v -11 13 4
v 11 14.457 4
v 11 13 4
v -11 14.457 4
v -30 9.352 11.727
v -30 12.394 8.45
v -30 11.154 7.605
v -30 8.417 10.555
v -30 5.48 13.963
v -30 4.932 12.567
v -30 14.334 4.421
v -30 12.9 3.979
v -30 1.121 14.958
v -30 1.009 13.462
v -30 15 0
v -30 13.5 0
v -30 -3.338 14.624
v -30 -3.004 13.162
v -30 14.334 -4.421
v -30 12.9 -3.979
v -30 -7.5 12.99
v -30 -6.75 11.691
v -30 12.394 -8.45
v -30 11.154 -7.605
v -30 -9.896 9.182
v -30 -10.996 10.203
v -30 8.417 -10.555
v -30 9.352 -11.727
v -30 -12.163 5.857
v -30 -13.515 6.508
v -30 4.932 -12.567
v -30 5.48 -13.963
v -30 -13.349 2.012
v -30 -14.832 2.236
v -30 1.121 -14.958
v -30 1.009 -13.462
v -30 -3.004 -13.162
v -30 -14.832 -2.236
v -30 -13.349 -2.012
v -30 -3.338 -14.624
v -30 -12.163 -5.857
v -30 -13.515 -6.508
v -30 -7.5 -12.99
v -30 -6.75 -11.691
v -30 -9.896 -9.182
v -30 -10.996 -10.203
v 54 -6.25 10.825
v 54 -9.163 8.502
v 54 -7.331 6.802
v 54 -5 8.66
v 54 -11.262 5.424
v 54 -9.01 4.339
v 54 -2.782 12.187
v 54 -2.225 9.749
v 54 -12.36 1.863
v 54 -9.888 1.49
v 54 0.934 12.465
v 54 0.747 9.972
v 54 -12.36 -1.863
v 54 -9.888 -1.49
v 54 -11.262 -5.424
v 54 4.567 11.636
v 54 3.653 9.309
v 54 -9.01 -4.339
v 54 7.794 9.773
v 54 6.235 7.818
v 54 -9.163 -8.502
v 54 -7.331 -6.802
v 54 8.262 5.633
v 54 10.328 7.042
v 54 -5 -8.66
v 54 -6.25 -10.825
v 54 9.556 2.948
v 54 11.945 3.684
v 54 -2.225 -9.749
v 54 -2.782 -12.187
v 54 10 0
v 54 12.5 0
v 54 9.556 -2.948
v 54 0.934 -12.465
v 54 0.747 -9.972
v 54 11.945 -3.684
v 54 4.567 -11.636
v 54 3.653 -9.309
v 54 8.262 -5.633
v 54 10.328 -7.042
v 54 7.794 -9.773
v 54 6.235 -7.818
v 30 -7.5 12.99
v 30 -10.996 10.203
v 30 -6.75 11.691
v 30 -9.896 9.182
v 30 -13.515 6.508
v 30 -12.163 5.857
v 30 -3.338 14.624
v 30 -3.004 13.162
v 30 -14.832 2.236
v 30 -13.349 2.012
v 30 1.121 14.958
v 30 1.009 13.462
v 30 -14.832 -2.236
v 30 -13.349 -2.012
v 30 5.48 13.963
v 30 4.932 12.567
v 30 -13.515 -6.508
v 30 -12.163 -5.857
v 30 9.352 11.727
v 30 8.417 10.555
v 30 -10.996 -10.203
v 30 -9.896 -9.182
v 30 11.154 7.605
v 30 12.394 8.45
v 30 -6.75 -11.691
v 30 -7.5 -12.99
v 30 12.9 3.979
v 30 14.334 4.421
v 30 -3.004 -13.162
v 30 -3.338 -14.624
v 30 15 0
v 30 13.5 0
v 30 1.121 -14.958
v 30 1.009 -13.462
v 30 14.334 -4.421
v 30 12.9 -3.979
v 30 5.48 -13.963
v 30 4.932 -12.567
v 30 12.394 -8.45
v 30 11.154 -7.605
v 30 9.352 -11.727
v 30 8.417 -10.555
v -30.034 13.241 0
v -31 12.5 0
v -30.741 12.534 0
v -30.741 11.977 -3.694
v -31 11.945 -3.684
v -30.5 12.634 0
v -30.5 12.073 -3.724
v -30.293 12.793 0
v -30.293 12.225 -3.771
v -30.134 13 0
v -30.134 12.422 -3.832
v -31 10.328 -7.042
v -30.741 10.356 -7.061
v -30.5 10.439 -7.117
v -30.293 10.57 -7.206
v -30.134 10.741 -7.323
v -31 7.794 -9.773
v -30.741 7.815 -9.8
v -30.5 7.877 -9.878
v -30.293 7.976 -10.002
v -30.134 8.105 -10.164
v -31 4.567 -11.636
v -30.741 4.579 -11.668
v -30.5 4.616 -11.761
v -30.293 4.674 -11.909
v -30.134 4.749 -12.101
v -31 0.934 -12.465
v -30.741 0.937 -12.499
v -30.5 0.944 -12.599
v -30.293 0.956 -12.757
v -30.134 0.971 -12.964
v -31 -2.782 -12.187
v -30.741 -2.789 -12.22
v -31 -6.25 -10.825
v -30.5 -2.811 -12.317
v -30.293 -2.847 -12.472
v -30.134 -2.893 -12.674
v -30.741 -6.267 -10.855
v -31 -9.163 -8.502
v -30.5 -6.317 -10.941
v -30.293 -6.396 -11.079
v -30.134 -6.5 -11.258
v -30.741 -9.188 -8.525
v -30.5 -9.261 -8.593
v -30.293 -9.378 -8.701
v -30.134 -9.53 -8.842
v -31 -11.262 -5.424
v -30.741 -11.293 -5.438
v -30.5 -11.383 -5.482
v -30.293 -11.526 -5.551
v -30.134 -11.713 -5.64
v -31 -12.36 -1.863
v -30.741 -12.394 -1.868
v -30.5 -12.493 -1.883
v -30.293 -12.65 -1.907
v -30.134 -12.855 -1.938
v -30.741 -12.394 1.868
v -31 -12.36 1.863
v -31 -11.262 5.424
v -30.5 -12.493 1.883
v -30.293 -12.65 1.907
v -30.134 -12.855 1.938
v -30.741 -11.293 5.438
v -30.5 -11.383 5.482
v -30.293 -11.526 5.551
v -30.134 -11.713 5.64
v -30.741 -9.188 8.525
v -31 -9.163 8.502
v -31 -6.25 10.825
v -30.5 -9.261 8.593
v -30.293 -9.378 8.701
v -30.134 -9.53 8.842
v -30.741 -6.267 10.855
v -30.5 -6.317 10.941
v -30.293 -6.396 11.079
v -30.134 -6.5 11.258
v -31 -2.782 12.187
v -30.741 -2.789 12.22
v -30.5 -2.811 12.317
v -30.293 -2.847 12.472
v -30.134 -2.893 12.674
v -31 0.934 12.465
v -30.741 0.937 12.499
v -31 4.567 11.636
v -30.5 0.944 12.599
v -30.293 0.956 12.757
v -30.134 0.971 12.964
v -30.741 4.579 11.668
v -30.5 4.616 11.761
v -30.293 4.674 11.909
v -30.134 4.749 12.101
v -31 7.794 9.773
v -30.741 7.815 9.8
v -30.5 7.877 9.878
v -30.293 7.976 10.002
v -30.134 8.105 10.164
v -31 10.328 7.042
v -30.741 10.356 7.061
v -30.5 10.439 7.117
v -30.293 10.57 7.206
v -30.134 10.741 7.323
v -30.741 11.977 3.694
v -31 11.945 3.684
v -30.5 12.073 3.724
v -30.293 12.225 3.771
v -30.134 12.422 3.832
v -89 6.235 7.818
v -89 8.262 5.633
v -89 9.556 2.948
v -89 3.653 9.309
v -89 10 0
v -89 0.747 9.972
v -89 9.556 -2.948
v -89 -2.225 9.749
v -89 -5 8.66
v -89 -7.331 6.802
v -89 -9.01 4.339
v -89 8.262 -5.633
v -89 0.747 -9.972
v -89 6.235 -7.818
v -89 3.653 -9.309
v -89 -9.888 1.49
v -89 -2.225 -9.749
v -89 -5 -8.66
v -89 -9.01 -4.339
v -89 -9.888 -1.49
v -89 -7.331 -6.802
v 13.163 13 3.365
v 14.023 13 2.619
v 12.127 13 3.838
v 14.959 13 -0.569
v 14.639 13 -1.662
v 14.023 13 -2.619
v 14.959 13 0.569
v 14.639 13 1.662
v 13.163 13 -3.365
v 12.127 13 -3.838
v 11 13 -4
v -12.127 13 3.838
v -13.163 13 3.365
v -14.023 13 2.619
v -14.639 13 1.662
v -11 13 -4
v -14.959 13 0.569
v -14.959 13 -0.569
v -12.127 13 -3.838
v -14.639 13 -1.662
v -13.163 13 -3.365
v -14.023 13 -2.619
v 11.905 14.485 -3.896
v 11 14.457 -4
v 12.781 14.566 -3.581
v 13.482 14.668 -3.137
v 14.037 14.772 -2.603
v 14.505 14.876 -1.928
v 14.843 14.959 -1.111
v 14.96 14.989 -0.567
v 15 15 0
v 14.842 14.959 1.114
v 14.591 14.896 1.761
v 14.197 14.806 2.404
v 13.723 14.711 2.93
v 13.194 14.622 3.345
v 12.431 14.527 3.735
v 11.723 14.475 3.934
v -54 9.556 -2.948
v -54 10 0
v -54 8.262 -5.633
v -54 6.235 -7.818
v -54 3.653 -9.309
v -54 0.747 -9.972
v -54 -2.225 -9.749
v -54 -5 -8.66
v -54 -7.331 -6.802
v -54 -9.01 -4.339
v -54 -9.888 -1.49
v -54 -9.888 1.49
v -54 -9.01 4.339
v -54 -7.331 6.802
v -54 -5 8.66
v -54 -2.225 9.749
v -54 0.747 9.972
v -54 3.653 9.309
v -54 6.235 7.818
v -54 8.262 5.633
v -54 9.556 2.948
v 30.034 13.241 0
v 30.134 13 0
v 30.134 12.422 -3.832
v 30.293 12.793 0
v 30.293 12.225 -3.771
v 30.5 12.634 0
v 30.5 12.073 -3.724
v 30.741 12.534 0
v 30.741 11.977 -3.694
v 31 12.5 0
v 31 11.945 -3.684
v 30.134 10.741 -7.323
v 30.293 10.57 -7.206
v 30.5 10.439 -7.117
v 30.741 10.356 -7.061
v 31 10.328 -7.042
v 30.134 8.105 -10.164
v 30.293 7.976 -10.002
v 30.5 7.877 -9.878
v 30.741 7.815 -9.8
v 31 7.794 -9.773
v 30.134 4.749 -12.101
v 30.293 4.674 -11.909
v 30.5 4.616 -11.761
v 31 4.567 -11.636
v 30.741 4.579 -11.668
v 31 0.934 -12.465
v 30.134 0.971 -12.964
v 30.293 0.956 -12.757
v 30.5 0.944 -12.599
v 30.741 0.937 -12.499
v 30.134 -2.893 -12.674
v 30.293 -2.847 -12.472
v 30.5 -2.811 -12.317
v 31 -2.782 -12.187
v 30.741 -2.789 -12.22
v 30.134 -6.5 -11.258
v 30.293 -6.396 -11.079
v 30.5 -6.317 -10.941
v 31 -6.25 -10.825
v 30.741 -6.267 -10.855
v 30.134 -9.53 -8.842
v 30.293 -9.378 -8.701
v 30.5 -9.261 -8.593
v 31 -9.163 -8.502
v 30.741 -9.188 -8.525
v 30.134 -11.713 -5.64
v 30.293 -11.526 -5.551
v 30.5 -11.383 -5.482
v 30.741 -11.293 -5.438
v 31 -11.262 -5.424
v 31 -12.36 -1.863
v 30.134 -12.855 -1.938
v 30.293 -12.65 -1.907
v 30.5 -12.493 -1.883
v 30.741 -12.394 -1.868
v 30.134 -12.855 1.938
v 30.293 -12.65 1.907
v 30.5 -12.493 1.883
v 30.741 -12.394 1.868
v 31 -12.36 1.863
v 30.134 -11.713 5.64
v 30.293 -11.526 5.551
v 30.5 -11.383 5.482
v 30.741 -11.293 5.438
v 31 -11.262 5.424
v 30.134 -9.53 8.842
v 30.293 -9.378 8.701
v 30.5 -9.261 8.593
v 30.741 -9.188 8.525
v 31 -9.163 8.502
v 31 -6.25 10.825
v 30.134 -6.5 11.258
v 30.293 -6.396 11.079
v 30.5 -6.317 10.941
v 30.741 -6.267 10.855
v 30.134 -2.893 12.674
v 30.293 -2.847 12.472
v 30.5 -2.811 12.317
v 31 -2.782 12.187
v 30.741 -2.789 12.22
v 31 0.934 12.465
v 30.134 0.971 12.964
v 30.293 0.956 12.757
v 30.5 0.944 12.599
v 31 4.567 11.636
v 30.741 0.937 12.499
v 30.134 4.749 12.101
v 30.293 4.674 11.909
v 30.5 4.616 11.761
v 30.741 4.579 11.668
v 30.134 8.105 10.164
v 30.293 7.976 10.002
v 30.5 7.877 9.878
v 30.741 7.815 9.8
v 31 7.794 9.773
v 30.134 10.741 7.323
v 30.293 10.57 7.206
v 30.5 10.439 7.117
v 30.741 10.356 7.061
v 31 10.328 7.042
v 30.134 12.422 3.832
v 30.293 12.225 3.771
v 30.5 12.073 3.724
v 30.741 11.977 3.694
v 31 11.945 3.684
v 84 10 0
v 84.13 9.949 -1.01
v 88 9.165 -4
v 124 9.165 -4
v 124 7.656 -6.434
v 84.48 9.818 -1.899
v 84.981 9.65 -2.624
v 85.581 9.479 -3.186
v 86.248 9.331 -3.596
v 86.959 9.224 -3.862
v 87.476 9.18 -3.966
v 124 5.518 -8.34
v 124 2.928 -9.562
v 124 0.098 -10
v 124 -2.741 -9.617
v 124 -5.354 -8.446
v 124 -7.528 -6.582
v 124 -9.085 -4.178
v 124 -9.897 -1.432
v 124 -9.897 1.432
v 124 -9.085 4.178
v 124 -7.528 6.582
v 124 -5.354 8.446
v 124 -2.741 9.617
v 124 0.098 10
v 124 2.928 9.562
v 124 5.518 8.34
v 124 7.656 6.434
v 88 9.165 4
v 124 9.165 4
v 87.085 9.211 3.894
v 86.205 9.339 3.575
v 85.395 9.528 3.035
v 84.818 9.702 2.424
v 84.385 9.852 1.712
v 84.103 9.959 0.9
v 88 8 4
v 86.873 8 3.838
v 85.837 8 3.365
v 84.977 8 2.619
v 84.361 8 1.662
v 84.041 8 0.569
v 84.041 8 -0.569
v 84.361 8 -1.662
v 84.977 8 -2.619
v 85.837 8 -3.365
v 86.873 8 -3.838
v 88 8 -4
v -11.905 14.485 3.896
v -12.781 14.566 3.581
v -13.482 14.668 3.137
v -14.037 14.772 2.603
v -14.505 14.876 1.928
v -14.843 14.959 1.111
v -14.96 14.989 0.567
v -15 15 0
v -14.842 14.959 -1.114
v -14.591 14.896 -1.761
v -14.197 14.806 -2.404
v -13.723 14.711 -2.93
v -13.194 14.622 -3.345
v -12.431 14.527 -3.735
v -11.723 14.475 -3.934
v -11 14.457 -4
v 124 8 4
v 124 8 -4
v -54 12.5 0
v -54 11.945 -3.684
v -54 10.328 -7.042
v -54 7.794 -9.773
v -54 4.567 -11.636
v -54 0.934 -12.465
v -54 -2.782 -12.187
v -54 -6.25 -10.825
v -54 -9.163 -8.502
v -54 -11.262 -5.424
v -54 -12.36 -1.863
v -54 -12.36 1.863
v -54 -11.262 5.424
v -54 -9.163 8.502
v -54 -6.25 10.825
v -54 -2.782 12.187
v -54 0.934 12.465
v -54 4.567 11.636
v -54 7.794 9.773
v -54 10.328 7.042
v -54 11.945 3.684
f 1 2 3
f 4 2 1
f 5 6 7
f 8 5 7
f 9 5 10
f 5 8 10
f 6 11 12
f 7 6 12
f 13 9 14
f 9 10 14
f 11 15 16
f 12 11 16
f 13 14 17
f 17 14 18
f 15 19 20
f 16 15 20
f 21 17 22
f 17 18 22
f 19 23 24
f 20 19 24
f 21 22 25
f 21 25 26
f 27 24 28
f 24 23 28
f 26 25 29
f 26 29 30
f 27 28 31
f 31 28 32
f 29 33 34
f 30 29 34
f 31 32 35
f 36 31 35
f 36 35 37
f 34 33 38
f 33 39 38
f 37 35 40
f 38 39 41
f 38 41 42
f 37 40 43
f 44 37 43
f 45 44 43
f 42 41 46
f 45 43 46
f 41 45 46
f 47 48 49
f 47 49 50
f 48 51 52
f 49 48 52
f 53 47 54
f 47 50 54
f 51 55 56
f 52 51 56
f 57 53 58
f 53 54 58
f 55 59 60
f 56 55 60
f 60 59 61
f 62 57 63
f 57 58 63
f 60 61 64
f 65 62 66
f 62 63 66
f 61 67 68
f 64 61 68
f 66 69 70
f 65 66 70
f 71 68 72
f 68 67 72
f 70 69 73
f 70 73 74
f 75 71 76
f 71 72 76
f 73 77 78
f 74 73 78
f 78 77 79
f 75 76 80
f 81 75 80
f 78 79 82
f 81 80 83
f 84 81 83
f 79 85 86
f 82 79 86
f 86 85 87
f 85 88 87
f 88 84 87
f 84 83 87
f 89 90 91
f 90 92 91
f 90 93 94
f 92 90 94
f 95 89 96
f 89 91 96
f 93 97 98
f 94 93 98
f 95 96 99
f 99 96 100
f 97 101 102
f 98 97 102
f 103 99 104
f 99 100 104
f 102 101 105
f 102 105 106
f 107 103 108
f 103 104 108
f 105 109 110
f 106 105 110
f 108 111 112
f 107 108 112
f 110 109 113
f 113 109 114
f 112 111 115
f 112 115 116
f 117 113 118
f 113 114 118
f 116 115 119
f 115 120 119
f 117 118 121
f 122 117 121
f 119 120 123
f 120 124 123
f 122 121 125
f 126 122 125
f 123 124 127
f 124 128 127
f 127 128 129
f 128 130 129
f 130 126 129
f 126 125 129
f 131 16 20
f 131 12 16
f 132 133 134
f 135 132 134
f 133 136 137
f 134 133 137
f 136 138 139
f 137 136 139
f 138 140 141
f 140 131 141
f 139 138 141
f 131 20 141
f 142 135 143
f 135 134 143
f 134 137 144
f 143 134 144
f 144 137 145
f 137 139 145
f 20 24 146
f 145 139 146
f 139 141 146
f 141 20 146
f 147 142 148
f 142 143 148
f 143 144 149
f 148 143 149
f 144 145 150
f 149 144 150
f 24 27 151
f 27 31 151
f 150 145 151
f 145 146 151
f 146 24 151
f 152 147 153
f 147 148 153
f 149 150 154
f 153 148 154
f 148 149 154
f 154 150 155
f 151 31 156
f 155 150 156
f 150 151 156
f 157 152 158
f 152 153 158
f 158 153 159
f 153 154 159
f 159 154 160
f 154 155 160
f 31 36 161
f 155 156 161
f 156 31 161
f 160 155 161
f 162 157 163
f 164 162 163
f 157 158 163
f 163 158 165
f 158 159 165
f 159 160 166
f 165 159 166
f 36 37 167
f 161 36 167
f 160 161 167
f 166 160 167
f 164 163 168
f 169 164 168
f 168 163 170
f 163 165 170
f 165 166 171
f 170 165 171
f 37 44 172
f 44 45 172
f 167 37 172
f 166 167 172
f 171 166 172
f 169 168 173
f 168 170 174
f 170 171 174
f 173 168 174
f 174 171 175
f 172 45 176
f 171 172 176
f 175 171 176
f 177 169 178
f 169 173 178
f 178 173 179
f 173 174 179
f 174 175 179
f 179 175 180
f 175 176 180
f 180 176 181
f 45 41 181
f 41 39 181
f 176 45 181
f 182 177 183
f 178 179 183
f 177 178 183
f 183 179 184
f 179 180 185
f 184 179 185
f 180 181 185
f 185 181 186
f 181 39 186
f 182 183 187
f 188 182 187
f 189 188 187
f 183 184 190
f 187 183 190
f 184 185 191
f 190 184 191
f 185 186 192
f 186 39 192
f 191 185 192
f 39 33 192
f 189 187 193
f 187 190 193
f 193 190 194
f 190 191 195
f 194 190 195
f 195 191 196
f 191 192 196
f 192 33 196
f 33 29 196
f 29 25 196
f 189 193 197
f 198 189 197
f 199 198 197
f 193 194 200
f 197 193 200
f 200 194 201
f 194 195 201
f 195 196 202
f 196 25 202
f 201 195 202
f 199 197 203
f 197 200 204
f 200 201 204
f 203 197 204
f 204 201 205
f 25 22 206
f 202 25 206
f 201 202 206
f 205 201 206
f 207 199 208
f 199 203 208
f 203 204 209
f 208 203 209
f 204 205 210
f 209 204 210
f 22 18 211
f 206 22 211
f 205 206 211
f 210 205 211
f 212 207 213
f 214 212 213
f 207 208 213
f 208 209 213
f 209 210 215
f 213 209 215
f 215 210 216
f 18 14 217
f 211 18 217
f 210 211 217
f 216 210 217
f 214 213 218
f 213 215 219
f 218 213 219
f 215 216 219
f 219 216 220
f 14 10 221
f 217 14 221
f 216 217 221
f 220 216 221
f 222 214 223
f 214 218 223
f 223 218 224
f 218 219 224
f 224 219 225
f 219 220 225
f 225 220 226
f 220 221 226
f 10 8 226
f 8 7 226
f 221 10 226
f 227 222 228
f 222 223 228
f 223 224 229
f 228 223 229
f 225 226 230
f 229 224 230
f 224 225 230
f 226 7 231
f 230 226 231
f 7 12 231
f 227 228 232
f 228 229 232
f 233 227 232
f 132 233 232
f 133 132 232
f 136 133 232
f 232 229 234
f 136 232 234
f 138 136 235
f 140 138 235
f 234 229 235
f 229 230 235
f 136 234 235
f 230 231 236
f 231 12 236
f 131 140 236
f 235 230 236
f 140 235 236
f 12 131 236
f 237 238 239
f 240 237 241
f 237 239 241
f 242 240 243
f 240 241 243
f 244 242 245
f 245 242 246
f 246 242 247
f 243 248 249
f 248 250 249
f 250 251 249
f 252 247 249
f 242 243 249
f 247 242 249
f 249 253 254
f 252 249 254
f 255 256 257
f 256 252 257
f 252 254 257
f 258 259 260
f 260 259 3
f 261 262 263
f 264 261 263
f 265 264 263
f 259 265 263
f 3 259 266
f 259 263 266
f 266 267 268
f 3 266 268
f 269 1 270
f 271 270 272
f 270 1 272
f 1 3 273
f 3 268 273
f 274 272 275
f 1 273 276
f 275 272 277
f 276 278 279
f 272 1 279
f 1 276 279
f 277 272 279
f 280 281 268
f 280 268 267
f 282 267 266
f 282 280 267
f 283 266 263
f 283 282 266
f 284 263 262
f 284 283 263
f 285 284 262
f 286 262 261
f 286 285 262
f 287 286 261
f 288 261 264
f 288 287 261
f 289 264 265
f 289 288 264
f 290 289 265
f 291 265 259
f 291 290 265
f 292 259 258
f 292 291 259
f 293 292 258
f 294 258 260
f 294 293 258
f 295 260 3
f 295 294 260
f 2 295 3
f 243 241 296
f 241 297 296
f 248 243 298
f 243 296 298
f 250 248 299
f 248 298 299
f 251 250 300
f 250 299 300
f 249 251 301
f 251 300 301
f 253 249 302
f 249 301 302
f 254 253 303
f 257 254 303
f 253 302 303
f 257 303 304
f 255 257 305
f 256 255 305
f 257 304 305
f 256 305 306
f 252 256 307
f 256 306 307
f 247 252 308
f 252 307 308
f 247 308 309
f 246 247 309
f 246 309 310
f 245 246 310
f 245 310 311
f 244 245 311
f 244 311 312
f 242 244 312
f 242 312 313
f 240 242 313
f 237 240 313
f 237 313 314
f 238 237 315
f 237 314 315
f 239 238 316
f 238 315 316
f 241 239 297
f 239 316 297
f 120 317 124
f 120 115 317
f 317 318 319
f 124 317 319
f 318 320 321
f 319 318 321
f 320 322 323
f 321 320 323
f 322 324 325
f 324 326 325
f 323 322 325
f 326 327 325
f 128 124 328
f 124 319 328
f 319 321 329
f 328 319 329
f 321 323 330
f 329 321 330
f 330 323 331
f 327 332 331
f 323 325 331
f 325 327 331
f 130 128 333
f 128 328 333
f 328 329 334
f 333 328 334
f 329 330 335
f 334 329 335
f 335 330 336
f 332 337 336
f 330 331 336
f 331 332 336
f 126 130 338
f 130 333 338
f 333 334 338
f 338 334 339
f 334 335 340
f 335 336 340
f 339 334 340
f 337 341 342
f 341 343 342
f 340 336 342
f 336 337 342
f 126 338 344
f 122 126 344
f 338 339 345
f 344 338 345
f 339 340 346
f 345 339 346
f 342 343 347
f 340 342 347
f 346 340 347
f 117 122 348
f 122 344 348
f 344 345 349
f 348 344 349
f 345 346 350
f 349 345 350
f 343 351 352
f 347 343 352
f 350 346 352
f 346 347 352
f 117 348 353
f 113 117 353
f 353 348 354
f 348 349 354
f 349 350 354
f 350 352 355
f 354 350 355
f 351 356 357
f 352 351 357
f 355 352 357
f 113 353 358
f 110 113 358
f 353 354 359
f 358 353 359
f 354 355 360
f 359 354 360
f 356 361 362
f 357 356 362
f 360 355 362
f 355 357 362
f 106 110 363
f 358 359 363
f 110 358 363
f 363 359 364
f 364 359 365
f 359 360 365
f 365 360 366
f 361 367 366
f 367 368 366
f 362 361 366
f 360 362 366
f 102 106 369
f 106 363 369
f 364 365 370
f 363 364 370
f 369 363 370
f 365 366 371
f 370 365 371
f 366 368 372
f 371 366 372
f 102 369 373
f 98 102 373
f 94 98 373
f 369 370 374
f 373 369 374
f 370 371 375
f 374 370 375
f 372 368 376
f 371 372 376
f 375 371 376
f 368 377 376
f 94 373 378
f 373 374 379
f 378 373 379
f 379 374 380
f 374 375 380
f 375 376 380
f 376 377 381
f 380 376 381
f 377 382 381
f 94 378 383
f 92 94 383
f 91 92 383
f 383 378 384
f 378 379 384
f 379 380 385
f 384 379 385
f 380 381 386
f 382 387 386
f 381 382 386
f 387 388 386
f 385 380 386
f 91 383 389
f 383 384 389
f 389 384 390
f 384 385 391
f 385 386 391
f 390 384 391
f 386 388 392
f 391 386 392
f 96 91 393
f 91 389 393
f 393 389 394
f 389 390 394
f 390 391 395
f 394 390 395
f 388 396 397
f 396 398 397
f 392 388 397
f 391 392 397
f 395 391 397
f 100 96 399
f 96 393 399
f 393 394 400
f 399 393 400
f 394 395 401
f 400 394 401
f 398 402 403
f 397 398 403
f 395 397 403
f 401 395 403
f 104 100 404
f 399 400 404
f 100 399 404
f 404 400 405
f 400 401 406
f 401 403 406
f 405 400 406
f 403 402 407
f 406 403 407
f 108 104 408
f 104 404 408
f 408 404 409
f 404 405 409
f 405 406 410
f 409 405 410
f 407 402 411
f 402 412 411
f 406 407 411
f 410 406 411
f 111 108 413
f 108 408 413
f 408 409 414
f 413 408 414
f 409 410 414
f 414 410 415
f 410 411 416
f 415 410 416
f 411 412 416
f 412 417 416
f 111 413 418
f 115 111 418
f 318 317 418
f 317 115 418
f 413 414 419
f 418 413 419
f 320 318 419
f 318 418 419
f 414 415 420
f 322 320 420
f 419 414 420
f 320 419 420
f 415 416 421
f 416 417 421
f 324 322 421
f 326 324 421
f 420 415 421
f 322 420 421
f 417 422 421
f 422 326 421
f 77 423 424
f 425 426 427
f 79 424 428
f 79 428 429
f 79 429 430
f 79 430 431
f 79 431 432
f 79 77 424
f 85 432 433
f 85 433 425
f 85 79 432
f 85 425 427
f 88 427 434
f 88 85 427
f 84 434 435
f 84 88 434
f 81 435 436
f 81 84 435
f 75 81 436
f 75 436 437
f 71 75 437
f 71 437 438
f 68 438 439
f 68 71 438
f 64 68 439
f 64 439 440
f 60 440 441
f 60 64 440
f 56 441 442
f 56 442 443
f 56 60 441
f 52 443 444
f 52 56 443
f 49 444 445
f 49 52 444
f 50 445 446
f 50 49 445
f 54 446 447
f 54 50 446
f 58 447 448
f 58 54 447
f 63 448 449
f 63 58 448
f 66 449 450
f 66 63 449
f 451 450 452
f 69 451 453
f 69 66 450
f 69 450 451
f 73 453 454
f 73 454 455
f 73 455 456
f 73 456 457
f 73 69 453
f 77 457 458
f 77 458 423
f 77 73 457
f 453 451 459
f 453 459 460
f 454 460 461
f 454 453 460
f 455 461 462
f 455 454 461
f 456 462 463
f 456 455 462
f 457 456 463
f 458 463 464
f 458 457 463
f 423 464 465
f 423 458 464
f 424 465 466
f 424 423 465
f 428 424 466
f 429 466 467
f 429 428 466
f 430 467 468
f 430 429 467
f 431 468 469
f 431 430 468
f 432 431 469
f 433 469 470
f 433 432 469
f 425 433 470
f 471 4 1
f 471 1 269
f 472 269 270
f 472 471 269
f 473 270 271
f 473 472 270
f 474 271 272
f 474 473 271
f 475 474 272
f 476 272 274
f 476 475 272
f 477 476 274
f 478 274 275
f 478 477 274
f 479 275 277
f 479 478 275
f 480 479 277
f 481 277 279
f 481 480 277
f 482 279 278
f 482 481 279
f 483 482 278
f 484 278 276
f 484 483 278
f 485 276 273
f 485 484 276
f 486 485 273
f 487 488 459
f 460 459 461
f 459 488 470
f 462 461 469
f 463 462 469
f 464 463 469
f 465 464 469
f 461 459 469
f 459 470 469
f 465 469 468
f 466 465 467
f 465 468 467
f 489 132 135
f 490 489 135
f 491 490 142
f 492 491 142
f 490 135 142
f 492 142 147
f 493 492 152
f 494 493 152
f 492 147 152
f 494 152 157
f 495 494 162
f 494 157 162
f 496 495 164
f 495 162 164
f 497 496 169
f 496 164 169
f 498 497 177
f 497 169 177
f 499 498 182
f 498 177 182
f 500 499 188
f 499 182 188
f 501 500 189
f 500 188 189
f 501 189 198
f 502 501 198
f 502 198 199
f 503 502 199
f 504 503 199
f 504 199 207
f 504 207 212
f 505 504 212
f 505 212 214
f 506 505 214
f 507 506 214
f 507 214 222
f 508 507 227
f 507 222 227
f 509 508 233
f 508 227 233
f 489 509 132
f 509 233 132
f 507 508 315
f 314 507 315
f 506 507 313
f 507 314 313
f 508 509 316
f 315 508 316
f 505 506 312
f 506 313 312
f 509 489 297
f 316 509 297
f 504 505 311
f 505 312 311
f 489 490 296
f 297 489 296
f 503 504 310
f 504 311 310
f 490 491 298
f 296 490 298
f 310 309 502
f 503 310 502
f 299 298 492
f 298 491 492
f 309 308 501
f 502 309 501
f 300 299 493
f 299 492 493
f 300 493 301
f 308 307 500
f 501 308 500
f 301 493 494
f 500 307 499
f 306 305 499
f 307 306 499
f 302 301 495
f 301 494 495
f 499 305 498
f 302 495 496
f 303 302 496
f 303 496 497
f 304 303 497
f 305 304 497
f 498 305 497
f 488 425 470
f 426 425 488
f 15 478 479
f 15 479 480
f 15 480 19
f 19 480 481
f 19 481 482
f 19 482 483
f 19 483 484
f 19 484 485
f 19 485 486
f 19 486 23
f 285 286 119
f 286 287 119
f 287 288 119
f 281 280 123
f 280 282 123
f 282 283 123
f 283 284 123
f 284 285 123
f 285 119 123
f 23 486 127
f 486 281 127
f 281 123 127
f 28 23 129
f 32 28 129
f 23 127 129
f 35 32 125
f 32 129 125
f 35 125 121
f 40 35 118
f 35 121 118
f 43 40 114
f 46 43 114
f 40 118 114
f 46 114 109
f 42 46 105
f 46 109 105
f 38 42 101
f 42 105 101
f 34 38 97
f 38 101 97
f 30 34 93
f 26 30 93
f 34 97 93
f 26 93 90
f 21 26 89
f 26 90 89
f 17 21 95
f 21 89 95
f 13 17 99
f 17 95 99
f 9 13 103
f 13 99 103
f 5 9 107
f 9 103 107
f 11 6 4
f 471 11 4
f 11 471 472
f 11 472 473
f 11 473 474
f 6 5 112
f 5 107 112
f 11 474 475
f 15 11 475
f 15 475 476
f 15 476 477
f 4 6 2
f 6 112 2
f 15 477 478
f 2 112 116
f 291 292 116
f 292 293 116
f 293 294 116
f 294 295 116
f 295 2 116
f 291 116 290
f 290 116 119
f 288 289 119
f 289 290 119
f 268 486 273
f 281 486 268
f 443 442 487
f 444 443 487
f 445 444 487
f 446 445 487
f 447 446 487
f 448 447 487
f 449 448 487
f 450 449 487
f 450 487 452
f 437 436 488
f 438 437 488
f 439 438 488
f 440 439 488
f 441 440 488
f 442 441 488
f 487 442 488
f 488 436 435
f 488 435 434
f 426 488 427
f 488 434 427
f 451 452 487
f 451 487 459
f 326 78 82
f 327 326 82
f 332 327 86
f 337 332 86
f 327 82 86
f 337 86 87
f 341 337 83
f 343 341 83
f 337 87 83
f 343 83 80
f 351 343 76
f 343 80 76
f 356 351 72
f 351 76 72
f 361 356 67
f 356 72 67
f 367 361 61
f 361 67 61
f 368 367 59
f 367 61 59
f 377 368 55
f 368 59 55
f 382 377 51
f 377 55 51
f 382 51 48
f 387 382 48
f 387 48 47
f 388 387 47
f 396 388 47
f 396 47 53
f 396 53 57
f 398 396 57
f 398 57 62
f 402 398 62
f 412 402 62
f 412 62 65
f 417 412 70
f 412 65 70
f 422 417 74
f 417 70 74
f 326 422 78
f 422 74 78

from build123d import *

# Parameters (mm, degrees)
FILLET1_R          = 1
CUT_EXTRUDE1_DEPTH = 2
CUT_EXTRUDE2_DEPTH = 2


with BuildPart() as part:
    # Sketch1 → Revolve2 (revolve)
    with BuildSketch(Plane.XY):
        Polygon((-89, 0), (-89, 10), (-54, 10), (-54, 12.5), (-30, 12.5), (-30, 15), (30, 15), (30, 12.5), (54, 12.5), (54, 10), (89, 10), (124, 10), (124, 0), align=None)
    revolve(axis=Axis((124, 0, 0), (-1, 0, 0)))

    # Fillet1
    fillet1_edges = [part.edges().sort_by_distance(p)[0] for p in [
        (30, -12.5, 0),
        (-30, -12.5, 0),
    ]]
    fillet(fillet1_edges, radius=FILLET1_R)

    # Sketch2 → Cut-Extrude1 (cut)
    with BuildSketch(Plane(origin=(0, 15, 0), x_dir=(1, 0, 0), z_dir=(0, 1, 0))):
        with BuildLine():
            Line((11, -4), (-11, -4))
            ThreePointArc((-11, -4), (-15, 0), (-11, 4))
            Line((-11, 4), (11, 4))
            ThreePointArc((11, 4), (15, 0), (11, -4))
        make_face()
    extrude(amount=-CUT_EXTRUDE1_DEPTH, mode=Mode.SUBTRACT)

    # Sketch3 → Cut-Extrude2 (cut)
    with BuildSketch(Plane(origin=(0, 10, 0), x_dir=(1, 0, 0), z_dir=(0, 1, 0))):
        with BuildLine():
            Line((124, -4), (88, -4))
            ThreePointArc((88, -4), (84, 0), (88, 4))
            Line((88, 4), (124, 4))
            Line((124, 4), (124, -4))
        make_face()
    extrude(amount=-CUT_EXTRUDE2_DEPTH, mode=Mode.SUBTRACT)


solid = part.part
